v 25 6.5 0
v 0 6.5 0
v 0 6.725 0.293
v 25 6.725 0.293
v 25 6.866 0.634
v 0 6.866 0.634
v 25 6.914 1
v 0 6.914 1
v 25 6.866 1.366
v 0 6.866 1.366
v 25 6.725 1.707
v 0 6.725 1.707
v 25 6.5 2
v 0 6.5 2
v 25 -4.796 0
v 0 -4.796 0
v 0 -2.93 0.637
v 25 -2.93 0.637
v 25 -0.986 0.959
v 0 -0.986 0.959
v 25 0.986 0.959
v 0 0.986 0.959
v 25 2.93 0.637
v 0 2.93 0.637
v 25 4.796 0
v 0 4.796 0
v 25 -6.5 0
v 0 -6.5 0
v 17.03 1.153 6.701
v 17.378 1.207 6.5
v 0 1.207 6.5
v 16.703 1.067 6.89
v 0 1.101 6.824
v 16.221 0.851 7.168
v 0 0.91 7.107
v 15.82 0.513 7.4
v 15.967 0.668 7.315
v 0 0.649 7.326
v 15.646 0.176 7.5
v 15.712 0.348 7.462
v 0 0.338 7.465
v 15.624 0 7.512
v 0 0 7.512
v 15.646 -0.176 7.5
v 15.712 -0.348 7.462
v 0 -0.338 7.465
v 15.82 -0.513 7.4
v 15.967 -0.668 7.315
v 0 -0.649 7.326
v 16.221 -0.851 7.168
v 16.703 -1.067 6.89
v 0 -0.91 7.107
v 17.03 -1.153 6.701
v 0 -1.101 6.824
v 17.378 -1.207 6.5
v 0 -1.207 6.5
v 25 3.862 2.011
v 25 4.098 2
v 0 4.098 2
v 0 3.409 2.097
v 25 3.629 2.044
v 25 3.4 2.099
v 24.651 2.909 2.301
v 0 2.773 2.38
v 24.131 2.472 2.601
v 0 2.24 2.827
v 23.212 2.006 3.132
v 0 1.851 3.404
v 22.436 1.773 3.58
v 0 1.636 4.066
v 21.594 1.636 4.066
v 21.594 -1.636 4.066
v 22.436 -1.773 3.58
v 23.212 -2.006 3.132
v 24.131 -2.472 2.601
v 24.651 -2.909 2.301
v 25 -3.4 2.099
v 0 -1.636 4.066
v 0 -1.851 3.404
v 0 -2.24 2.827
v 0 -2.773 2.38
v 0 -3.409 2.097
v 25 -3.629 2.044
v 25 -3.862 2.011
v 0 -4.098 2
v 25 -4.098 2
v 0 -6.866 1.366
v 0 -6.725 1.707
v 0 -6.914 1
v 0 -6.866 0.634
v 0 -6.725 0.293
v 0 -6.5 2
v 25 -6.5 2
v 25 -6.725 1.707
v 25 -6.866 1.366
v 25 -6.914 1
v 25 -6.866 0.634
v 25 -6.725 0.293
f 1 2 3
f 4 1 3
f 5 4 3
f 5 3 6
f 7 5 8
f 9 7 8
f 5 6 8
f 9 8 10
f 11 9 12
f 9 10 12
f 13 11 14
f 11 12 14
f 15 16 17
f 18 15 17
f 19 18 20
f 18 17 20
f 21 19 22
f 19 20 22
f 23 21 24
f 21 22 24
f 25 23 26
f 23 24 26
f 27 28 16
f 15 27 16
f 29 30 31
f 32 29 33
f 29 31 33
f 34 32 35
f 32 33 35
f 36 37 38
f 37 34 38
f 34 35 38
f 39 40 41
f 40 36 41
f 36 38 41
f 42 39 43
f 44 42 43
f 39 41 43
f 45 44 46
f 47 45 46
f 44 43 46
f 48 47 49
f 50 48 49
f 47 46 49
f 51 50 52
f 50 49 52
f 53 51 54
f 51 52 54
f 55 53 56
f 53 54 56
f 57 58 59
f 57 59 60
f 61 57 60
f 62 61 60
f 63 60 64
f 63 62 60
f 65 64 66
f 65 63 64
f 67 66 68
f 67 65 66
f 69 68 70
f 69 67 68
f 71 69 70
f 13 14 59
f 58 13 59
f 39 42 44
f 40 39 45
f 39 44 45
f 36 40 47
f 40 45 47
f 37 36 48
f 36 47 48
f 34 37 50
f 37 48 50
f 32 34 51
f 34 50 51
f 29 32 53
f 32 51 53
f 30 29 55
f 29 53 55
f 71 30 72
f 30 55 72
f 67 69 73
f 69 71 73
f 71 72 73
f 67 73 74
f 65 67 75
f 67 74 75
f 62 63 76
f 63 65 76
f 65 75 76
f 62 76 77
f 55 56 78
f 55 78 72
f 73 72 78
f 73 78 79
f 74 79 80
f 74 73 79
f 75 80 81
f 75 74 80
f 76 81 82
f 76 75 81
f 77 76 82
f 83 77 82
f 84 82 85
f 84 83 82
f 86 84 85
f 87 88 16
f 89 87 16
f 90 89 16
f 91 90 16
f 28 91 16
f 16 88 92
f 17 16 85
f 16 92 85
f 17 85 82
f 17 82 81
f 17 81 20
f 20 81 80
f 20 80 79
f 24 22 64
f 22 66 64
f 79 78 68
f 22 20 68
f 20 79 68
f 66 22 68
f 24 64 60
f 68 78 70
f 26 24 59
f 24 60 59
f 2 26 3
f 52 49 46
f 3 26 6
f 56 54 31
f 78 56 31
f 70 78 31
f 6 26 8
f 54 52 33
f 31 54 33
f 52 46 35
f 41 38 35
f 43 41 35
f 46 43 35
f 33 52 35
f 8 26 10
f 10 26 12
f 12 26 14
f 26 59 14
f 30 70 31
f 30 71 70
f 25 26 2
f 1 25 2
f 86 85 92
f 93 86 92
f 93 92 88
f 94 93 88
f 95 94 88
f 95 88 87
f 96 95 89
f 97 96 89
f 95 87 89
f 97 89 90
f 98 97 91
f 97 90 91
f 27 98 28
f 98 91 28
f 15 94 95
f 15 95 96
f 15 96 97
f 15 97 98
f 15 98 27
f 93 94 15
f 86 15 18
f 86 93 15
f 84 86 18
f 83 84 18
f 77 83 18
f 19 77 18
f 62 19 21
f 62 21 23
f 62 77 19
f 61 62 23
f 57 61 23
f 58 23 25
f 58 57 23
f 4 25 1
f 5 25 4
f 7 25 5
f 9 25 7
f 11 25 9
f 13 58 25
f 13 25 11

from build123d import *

# Parameters (mm, degrees)
F1_DEPTH      = 25
F2_R          = 2.5
F4_DEPTH      = 6.9152135624
F4_DEPTH_BACK = 6.9152135624


with BuildPart() as f1:
    # F0 (on Right) → F1 (new body)
    with BuildSketch(Plane.YZ):
        with BuildLine():
            Line((-6.5, 0), (-4.7958315233, 0))
            ThreePointArc((-4.7958315233, 0), (0, 1), (4.7958315233, 0))
            Line((4.7958315233, 0), (6.5, 0))
            ThreePointArc((6.5, 0), (6.9142135624, 1), (6.5, 2))
            Line((6.5, 2), (2, 2))
            Line((2, 2), (1.2065285868, 6.5))
            ThreePointArc((1.2065285868, 6.5), (0, 7.5123976922), (-1.2065285868, 6.5))
            Line((-1.2065285868, 6.5), (-2, 2))
            Line((-2, 2), (-6.5, 2))
            ThreePointArc((-6.5, 2), (-6.9142135624, 1), (-6.5, 0))
        make_face()
    extrude(amount=F1_DEPTH)

    # F2
    f2_edges = [f1.edges().sort_by_distance(p)[0] for p in [
        (12.5, 2, 2),
        (12.5, -2, 2),
    ]]
    fillet(f2_edges, radius=F2_R)

    # F3 (on Front) → F4 (cut, two sides)
    with BuildSketch(Plane.XZ) as f4_sk:
        Polygon((8, 11.9143333792), (30, -0.787372543), (30, 11.9143333792), align=None)
    extrude(amount=-F4_DEPTH, mode=Mode.SUBTRACT)
    extrude(f4_sk.sketch, amount=F4_DEPTH_BACK, mode=Mode.SUBTRACT)


solid = f1.part
